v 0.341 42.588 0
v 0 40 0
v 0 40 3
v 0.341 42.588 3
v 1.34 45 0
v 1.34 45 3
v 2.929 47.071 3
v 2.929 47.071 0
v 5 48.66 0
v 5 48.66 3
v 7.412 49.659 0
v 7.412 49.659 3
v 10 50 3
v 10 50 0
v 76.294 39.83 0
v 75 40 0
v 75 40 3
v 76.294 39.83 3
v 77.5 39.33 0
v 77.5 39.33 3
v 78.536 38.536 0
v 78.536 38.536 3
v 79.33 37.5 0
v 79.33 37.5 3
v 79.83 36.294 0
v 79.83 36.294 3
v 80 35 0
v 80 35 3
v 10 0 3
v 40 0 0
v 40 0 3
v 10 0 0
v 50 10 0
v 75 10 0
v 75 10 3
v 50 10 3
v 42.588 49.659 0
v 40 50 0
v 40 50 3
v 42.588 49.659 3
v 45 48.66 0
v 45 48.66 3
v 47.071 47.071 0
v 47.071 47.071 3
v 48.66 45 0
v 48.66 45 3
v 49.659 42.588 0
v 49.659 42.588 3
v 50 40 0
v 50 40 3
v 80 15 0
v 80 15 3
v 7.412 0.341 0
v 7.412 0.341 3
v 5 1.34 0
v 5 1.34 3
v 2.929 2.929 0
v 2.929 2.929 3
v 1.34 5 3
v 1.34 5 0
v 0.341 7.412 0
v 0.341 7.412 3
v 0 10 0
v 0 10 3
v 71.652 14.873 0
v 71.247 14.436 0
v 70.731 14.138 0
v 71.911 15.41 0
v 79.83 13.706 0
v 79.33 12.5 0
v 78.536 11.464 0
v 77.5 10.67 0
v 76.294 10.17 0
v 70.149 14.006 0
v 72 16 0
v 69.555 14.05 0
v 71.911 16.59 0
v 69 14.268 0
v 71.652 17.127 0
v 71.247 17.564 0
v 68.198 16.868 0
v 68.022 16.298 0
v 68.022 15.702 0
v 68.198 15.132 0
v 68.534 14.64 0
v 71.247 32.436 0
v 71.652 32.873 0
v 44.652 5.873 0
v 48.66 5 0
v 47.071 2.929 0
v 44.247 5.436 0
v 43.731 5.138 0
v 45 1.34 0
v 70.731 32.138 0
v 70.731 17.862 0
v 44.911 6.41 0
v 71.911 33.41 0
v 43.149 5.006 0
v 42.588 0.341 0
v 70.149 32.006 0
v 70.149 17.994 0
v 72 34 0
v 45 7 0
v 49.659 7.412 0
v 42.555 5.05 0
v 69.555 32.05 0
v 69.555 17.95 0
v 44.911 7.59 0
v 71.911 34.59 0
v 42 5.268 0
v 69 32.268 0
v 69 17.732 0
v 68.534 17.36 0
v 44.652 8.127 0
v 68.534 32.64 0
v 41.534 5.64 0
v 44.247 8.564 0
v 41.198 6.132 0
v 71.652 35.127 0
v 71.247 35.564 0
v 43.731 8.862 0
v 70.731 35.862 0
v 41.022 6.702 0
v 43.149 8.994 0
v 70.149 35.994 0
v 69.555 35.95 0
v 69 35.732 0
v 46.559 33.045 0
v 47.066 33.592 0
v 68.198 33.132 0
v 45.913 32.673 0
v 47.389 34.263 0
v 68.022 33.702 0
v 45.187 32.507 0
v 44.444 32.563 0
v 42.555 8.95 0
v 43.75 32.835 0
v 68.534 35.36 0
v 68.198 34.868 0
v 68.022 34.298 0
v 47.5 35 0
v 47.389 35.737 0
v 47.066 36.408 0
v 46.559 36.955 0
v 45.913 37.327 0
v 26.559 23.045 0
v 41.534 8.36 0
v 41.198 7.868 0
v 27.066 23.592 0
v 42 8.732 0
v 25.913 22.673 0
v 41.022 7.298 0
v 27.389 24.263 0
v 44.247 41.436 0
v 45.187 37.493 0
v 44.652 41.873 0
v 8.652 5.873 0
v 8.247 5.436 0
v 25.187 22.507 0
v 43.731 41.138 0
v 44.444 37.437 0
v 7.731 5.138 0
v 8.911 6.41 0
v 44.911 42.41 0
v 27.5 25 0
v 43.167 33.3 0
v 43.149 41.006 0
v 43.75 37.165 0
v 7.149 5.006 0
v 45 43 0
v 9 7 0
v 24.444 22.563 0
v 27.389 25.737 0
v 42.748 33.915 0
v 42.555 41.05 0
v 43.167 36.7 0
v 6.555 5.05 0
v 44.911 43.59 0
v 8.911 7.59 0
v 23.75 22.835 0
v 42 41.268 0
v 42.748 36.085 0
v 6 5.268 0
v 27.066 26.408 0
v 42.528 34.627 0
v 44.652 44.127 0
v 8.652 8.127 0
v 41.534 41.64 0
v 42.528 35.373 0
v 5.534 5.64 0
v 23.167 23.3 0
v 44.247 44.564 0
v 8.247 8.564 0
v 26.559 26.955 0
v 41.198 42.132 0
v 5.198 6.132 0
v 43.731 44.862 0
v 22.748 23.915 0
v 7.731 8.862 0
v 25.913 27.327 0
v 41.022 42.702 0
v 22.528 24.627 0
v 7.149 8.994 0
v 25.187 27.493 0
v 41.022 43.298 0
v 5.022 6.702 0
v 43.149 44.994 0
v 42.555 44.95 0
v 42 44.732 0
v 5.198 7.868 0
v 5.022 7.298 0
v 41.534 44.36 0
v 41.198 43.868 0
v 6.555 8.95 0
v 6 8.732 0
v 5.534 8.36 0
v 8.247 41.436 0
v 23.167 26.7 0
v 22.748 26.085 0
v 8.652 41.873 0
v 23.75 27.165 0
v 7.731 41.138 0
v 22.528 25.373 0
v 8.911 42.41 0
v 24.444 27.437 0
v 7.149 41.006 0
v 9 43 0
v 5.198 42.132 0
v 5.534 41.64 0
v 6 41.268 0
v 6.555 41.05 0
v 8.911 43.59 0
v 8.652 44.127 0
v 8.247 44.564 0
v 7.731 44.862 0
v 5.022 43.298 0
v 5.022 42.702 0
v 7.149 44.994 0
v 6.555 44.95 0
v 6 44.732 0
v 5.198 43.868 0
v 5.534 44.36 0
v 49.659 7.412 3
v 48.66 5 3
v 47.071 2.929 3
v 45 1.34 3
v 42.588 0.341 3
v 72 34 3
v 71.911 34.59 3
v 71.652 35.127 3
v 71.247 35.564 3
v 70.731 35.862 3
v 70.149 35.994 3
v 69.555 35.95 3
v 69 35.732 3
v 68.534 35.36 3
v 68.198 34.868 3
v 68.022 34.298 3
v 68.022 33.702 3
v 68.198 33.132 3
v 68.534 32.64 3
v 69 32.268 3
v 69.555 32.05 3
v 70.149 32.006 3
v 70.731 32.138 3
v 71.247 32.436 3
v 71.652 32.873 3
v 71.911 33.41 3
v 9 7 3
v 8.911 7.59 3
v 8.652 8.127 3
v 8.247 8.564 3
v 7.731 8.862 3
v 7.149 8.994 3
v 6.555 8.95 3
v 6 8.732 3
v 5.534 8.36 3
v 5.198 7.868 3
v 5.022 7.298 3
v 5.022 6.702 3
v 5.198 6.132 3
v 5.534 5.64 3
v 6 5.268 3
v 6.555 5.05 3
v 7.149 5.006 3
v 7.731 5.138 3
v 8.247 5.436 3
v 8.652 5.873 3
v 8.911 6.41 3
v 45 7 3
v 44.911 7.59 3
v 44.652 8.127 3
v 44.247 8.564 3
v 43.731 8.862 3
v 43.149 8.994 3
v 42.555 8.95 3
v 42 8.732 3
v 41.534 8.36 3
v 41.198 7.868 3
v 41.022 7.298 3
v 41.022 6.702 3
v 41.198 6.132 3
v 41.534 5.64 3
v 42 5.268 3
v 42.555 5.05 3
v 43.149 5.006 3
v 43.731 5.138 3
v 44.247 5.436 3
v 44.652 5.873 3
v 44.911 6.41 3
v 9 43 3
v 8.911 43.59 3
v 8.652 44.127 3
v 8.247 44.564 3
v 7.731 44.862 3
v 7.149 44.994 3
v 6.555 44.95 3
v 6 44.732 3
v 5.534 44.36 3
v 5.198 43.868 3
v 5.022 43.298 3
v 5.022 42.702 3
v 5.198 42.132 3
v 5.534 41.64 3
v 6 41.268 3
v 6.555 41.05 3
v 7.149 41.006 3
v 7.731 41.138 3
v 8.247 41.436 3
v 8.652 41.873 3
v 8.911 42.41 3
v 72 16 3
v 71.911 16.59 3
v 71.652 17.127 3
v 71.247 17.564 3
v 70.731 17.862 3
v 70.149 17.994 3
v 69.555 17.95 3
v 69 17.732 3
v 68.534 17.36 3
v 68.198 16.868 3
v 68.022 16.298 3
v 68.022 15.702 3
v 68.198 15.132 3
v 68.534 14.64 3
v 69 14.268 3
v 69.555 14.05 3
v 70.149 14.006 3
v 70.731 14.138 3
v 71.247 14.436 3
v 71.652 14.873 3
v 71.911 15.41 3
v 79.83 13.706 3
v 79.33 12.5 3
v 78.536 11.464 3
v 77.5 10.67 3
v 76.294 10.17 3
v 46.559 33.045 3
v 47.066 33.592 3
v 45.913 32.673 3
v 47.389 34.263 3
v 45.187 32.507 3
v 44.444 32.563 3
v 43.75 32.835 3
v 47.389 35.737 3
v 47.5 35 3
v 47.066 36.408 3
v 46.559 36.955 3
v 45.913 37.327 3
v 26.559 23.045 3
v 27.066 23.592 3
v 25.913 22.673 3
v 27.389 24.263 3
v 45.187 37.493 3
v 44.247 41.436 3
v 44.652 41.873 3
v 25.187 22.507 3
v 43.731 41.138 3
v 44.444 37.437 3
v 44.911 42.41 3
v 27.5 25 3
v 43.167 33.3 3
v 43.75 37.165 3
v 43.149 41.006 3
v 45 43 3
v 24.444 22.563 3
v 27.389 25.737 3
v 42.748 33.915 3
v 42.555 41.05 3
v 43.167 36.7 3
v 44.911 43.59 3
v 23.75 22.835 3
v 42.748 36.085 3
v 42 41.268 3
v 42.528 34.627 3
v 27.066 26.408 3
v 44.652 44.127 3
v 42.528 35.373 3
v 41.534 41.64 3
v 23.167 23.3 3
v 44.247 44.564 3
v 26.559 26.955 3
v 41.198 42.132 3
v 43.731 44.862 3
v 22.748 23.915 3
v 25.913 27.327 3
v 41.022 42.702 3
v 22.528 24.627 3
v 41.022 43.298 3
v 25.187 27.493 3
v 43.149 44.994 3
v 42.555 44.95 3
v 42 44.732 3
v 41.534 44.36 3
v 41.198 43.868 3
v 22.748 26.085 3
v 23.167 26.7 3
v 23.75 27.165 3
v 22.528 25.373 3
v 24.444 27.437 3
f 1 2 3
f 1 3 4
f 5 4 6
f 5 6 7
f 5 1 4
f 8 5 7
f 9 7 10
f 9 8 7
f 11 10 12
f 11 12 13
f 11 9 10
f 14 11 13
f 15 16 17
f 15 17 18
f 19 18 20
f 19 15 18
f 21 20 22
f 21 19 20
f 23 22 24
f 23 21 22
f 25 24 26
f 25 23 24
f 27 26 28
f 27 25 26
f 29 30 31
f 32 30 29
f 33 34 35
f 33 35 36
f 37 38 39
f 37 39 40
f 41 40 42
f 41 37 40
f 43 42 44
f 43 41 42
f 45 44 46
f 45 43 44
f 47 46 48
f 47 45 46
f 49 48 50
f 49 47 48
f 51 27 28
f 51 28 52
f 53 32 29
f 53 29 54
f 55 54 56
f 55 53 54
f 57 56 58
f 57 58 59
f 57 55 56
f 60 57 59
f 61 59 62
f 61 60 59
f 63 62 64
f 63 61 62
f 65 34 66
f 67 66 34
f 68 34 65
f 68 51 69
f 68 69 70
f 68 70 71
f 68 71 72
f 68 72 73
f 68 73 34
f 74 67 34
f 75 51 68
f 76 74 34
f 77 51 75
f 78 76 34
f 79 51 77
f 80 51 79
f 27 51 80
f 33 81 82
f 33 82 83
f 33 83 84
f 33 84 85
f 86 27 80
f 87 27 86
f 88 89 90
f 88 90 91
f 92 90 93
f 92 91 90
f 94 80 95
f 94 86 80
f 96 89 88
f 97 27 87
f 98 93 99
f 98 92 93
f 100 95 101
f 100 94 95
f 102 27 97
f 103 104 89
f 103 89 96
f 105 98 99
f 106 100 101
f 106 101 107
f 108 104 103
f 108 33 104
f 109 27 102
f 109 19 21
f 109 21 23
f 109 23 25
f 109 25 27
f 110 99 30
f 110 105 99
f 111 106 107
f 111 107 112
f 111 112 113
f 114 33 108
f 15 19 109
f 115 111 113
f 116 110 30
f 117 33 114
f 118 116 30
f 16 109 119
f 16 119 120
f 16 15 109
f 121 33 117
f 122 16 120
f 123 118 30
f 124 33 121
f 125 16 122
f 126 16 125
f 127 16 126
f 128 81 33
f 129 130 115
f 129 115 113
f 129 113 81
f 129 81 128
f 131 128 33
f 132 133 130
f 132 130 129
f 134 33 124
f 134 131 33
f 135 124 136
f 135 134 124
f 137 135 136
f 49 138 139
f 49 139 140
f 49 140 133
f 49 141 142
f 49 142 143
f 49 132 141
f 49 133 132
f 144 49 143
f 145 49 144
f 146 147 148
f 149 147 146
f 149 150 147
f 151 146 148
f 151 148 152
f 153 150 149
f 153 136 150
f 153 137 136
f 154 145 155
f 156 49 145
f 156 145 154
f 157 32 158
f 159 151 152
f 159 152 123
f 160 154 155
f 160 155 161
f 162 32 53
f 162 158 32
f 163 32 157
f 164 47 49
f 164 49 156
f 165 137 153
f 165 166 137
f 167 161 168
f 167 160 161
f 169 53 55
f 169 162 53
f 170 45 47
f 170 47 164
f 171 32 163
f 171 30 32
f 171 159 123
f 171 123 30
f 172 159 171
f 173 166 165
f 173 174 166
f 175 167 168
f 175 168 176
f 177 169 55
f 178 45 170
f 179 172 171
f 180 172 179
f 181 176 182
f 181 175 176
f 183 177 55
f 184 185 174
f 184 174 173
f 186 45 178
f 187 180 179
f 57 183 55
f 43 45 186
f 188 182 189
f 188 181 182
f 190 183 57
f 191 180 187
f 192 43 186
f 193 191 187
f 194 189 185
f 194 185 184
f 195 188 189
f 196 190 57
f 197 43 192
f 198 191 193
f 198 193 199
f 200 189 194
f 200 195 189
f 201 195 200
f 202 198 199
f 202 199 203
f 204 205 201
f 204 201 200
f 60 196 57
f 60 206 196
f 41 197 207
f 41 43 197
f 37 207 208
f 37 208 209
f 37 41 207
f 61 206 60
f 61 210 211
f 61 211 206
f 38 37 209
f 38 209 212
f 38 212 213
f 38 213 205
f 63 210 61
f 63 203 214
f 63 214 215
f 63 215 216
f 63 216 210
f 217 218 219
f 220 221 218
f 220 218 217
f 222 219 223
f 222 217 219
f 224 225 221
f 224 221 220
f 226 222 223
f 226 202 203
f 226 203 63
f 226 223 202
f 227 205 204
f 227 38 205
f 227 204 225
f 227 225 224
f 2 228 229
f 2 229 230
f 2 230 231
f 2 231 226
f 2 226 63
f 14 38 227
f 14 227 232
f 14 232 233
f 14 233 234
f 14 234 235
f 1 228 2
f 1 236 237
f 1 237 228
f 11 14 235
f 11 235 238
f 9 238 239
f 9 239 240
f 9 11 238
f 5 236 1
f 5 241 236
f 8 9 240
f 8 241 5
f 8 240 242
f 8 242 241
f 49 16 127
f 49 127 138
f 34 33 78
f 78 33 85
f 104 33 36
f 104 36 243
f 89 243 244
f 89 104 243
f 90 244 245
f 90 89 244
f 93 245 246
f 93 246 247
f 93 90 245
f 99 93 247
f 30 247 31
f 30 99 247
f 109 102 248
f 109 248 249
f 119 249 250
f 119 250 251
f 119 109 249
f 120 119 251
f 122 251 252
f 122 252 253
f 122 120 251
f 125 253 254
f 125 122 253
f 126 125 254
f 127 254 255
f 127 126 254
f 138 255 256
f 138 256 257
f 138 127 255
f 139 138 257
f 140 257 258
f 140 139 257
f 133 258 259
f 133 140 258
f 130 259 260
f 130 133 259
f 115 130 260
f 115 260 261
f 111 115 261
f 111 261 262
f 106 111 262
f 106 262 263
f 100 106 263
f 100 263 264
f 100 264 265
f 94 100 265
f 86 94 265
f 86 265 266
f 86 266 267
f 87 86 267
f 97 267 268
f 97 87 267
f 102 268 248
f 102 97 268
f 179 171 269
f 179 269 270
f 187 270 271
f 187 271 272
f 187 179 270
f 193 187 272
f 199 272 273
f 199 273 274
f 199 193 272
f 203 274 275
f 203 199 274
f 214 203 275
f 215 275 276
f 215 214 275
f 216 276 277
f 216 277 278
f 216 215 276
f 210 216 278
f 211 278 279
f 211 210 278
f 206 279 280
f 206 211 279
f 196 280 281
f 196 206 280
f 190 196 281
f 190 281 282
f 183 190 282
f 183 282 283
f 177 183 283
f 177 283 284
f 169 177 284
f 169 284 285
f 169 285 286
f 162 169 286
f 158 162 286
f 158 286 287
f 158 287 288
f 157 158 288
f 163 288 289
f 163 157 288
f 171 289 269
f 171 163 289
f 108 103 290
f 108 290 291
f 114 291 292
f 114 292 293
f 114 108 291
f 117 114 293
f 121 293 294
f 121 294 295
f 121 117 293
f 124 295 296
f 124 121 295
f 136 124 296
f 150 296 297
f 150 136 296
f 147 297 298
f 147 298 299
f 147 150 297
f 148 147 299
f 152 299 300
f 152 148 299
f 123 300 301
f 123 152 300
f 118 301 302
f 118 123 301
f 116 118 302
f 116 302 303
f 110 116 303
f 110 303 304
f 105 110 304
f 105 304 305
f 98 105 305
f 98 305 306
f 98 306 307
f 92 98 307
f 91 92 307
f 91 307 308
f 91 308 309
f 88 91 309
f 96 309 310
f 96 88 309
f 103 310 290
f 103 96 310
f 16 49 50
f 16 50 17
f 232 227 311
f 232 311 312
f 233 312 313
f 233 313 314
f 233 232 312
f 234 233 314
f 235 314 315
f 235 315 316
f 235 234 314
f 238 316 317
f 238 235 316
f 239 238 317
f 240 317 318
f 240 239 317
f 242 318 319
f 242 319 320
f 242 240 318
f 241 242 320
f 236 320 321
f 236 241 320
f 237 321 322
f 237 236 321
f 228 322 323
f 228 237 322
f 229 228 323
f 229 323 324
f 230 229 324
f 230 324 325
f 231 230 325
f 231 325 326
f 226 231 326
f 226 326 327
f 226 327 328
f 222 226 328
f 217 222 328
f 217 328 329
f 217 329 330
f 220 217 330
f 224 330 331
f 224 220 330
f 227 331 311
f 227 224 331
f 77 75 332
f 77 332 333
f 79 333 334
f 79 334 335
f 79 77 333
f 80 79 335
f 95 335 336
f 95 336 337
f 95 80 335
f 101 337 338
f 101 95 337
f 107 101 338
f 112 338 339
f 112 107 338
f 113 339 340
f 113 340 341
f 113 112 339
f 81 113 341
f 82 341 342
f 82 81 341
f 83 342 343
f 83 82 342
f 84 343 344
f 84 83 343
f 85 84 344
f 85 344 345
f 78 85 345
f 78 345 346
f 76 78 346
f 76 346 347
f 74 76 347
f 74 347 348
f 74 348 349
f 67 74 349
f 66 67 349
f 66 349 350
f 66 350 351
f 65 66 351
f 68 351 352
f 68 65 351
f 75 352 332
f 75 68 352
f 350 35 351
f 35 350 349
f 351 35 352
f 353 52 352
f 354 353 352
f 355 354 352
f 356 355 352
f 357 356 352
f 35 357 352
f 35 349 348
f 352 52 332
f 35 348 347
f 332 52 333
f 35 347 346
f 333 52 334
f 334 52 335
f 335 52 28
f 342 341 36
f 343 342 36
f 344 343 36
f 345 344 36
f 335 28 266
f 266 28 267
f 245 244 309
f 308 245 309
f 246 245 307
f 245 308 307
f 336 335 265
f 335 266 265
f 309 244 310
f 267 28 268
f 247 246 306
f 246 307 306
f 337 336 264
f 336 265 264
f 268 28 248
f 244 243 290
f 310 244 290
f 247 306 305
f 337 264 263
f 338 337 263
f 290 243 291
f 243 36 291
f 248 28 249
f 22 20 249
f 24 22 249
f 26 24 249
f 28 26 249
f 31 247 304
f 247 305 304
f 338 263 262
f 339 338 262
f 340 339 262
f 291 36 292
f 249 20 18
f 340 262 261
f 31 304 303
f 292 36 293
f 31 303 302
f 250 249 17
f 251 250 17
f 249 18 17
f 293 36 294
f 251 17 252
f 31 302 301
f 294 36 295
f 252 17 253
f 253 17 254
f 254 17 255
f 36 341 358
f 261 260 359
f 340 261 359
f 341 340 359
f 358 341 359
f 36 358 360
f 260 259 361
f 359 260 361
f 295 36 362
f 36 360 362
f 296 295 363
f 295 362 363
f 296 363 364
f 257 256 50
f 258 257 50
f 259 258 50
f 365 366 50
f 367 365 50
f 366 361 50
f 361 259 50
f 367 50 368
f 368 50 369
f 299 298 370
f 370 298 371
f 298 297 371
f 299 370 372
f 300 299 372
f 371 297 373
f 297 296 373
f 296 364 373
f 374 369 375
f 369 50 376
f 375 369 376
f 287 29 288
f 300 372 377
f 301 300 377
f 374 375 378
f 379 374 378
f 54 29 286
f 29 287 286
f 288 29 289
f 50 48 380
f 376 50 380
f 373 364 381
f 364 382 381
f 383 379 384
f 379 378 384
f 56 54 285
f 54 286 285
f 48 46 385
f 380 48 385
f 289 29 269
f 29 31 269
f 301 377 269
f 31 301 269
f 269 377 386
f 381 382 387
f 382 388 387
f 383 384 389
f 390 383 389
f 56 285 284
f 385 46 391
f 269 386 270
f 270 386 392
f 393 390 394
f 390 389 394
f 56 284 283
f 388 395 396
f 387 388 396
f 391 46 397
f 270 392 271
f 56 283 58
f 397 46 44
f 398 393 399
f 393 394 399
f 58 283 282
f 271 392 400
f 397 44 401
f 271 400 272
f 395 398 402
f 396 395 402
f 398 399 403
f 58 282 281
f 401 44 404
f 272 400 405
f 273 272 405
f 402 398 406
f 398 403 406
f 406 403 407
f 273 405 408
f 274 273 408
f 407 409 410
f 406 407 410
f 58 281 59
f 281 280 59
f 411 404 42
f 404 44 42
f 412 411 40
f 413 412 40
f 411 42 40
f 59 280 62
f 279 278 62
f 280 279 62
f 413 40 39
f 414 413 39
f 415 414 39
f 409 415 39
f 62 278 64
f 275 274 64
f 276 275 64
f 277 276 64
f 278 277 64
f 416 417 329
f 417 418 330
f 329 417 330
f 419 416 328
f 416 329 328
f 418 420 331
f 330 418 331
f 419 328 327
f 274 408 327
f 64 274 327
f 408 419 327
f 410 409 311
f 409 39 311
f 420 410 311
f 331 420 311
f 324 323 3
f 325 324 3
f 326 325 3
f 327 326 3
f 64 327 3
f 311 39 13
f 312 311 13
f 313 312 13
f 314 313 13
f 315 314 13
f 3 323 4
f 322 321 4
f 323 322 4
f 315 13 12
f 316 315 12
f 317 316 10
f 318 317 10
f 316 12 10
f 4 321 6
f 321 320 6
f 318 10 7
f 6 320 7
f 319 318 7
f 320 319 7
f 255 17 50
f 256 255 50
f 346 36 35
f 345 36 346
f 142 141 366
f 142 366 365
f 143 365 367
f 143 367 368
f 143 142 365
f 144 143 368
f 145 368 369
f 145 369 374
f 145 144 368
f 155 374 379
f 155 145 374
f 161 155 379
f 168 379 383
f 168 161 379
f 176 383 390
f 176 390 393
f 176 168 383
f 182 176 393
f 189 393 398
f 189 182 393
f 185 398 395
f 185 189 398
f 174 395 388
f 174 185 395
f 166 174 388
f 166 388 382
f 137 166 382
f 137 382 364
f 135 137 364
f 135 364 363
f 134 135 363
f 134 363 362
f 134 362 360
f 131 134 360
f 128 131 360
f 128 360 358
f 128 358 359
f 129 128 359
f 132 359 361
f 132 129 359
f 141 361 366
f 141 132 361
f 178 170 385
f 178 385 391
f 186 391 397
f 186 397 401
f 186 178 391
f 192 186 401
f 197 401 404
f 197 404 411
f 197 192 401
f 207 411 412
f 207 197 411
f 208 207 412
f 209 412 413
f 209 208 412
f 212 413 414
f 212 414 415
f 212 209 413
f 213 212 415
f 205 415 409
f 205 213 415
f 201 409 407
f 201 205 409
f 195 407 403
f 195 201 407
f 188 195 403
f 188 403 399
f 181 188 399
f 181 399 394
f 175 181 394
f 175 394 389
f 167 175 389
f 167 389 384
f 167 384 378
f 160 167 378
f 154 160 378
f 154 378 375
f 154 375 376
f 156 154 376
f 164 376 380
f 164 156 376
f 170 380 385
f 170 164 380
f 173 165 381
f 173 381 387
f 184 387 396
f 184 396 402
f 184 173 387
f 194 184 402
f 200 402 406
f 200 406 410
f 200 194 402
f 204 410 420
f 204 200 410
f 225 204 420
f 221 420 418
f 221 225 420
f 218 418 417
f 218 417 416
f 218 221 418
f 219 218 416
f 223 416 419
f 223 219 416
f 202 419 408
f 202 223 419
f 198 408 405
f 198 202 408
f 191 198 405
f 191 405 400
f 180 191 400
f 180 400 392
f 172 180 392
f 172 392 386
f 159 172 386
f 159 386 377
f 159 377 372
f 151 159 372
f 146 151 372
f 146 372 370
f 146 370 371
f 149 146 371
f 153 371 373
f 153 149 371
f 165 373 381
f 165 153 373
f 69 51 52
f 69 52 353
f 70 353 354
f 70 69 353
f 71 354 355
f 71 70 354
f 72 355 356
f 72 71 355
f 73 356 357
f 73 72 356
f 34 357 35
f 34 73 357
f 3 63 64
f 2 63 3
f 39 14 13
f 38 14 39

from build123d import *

# Parameters (mm, degrees)
CROQUIS1_R              = 2.5
CROQUIS1_R_2            = 2
SALIENTE_EXTRUIR1_DEPTH = 3


with BuildPart() as part:
    # Croquis1 → Saliente-Extruir1 (new body)
    with BuildSketch(Plane.XY):
        with BuildLine():
            ThreePointArc((0, 40), (2.928932188, 47.071067812), (10, 50))
            Line((10, 50), (40, 50))
            ThreePointArc((40, 50), (47.071067812, 47.071067812), (50, 40))
            Line((50, 40), (50, 10))
            ThreePointArc((50, 10), (47.071067812, 2.928932188), (40, 0))
            Line((40, 0), (10, 0))
            ThreePointArc((10, 0), (2.928932188, 2.928932188), (0, 10))
            Line((0, 10), (0, 40))
        make_face()
        with Locations((45, 35)):
            Circle(CROQUIS1_R, mode=Mode.SUBTRACT)
        with Locations((25, 25)):
            Circle(CROQUIS1_R, mode=Mode.SUBTRACT)
        with Locations((43, 43)):
            Circle(CROQUIS1_R_2, mode=Mode.SUBTRACT)
        with Locations((7, 43)):
            Circle(CROQUIS1_R_2, mode=Mode.SUBTRACT)
        with Locations((43, 7)):
            Circle(CROQUIS1_R_2, mode=Mode.SUBTRACT)
        with Locations((7, 7)):
            Circle(CROQUIS1_R_2, mode=Mode.SUBTRACT)
        with BuildLine():
            ThreePointArc((75, 40), (78.535533906, 38.535533906), (80, 35))
            Line((80, 35), (80, 15))
            ThreePointArc((80, 15), (78.535533906, 11.464466094), (75, 10))
            Line((75, 10), (50, 10))
            Line((50, 10), (50, 40))
            Line((50, 40), (75, 40))
        make_face()
        with Locations((70, 16)):
            Circle(CROQUIS1_R_2, mode=Mode.SUBTRACT)
        with Locations((70, 34)):
            Circle(CROQUIS1_R_2, mode=Mode.SUBTRACT)
    extrude(amount=SALIENTE_EXTRUIR1_DEPTH)


solid = part.part
